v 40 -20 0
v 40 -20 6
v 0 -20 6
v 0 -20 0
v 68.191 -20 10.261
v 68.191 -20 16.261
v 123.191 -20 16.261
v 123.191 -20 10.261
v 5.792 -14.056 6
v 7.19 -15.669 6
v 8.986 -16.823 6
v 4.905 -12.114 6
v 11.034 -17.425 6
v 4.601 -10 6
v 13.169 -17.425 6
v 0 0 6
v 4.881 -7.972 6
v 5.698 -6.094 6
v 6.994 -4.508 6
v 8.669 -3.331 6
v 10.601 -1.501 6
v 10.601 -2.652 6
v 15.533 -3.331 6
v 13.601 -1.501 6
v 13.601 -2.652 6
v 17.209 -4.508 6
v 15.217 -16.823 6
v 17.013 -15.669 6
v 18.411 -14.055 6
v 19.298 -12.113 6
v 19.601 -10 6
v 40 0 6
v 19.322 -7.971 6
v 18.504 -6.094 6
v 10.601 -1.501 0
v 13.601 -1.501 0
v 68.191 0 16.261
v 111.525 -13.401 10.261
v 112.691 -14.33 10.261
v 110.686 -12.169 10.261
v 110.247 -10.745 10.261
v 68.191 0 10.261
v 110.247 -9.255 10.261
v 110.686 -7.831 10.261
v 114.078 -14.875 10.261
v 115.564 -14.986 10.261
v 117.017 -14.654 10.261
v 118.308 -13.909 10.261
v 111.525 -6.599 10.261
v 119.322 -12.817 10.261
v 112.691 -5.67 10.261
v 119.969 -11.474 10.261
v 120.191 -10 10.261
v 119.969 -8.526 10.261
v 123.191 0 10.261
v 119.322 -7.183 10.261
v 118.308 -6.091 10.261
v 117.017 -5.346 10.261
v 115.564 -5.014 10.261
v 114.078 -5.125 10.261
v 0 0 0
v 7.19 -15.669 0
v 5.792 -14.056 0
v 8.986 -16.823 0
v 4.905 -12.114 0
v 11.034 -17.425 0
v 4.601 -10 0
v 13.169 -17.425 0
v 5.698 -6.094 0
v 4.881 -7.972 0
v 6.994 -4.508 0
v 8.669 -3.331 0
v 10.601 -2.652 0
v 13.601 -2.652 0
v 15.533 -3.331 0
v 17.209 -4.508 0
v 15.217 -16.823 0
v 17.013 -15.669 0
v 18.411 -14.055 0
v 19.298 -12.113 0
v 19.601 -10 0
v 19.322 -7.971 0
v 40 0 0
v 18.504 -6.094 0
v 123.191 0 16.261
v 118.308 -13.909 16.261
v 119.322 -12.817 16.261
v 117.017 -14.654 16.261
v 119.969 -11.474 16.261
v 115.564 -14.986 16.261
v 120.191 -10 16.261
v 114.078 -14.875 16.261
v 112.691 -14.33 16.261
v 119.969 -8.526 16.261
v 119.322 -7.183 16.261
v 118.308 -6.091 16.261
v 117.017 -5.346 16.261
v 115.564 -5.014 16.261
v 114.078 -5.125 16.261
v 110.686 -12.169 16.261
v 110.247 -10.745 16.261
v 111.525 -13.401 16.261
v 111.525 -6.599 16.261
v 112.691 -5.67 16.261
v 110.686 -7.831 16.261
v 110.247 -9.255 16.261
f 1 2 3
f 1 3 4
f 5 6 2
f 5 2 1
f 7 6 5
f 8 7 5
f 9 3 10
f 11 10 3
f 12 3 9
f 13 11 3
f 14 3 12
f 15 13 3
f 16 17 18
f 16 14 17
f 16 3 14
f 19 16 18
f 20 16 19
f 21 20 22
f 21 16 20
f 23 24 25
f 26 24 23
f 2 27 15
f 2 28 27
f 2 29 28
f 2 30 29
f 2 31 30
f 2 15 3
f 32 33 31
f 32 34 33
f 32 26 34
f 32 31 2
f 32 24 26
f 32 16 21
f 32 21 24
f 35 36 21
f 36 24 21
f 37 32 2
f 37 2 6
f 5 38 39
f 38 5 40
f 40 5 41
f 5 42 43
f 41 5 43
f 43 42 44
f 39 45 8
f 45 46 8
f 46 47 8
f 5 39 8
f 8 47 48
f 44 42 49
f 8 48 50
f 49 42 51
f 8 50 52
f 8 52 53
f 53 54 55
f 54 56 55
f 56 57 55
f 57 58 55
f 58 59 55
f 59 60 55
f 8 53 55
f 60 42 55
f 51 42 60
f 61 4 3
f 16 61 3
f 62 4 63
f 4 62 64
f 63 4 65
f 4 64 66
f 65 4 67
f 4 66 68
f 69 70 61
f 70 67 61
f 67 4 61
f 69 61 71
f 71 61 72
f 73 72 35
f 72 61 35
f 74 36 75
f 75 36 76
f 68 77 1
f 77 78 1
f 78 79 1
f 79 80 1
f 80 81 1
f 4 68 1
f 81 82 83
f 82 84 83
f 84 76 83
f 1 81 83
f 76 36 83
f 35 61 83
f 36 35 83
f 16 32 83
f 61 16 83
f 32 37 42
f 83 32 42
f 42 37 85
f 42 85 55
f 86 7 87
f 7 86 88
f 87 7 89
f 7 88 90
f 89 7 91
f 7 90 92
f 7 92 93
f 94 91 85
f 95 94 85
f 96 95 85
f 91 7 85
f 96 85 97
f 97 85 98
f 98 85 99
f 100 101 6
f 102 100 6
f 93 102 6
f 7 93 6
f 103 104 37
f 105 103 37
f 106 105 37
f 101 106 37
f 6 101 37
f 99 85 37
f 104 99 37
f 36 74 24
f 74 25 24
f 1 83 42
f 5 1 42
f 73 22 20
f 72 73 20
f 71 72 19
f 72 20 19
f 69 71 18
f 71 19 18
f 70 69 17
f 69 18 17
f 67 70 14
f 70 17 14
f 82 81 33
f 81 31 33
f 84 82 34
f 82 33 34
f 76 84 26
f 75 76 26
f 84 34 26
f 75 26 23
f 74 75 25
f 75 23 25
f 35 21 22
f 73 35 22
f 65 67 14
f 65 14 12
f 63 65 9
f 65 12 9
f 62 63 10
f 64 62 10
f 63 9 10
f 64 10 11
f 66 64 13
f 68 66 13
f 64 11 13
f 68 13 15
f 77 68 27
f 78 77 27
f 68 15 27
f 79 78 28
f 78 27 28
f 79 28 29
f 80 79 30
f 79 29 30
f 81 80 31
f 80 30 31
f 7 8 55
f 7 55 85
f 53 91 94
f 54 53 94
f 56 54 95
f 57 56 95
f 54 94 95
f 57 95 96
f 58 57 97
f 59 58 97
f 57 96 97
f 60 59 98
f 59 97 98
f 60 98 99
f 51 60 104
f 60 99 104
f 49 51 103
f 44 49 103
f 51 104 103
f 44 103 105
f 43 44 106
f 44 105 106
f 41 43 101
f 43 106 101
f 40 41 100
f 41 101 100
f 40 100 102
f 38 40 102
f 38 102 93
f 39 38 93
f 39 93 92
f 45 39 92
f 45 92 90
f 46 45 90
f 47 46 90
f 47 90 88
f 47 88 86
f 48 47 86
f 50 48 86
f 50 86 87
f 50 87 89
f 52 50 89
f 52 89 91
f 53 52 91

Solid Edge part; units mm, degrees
sketch "Sketch1" plane through (0, 0, 0) normal (0, -1, 0) x (1, 0, 0)
  line L0 (0, 0) -> (40, 0)
  line L1 (40, 0) -> (68.1908, 10.2606)
  line L2 (68.1908, 10.2606) -> (123.1908, 10.2606)
  line L3 (123.1908, 10.2606) -> (123.1908, 16.2606)
  line L4 (123.1908, 16.2606) -> (68.1908, 16.2606)
  line L5 (40, 6) -> (68.1908, 16.2606)
  line L6 (0, 6) -> (40, 6)
  line L7 (0, 0) -> (0, 6)
  dimension "D1" = 40
  dimension "D2" = 6
  dimension "D3" = 55
  dimension "D4" = 30
  dimension "D5" = 6
  dimension "D6" = 40
extrude "Protrusion1" add sketch "Sketch1" along normal blind 20
sketch "Sketch2" plane through (182.9846, -10, 16.2606) normal (0, 0, 1) x (1, 0, 0)
  circle A0 centre (-67.7939, 0) radius 5
  dimension "D1" = 10
  dimension "D2" = 8
extrude "Cutout1" cut sketch "Sketch2" against normal up to surface (6 mm away)
sketch "Sketch3" plane through (43, -10, 6) normal (0, 0, 1) x (1, 0, 0)
  circle A0 centre (-30.8988, 0) radius 0.4991
  circle A1 centre (-30.8988, -0.0009) radius 7.5
  line L0 (-29.3988, 8.4991) -> (-32.3988, 8.4991)
  line L1 (-32.3988, 8.4991) -> (-32.3988, 6.4991)
  line L2 (-32.3988, 6.4991) -> (-29.3988, 6.4991)
  line L3 (-29.3988, 6.4991) -> (-29.3988, 8.4991)
  circle A2 centre (-30.8988, 0) radius 7.5
  dimension "D1" = 6.5
  dimension "D2" = 2
  dimension "D3" = 3
extrude "Cutout2" cut sketch "Sketch3" against normal up to surface (6 mm away)
